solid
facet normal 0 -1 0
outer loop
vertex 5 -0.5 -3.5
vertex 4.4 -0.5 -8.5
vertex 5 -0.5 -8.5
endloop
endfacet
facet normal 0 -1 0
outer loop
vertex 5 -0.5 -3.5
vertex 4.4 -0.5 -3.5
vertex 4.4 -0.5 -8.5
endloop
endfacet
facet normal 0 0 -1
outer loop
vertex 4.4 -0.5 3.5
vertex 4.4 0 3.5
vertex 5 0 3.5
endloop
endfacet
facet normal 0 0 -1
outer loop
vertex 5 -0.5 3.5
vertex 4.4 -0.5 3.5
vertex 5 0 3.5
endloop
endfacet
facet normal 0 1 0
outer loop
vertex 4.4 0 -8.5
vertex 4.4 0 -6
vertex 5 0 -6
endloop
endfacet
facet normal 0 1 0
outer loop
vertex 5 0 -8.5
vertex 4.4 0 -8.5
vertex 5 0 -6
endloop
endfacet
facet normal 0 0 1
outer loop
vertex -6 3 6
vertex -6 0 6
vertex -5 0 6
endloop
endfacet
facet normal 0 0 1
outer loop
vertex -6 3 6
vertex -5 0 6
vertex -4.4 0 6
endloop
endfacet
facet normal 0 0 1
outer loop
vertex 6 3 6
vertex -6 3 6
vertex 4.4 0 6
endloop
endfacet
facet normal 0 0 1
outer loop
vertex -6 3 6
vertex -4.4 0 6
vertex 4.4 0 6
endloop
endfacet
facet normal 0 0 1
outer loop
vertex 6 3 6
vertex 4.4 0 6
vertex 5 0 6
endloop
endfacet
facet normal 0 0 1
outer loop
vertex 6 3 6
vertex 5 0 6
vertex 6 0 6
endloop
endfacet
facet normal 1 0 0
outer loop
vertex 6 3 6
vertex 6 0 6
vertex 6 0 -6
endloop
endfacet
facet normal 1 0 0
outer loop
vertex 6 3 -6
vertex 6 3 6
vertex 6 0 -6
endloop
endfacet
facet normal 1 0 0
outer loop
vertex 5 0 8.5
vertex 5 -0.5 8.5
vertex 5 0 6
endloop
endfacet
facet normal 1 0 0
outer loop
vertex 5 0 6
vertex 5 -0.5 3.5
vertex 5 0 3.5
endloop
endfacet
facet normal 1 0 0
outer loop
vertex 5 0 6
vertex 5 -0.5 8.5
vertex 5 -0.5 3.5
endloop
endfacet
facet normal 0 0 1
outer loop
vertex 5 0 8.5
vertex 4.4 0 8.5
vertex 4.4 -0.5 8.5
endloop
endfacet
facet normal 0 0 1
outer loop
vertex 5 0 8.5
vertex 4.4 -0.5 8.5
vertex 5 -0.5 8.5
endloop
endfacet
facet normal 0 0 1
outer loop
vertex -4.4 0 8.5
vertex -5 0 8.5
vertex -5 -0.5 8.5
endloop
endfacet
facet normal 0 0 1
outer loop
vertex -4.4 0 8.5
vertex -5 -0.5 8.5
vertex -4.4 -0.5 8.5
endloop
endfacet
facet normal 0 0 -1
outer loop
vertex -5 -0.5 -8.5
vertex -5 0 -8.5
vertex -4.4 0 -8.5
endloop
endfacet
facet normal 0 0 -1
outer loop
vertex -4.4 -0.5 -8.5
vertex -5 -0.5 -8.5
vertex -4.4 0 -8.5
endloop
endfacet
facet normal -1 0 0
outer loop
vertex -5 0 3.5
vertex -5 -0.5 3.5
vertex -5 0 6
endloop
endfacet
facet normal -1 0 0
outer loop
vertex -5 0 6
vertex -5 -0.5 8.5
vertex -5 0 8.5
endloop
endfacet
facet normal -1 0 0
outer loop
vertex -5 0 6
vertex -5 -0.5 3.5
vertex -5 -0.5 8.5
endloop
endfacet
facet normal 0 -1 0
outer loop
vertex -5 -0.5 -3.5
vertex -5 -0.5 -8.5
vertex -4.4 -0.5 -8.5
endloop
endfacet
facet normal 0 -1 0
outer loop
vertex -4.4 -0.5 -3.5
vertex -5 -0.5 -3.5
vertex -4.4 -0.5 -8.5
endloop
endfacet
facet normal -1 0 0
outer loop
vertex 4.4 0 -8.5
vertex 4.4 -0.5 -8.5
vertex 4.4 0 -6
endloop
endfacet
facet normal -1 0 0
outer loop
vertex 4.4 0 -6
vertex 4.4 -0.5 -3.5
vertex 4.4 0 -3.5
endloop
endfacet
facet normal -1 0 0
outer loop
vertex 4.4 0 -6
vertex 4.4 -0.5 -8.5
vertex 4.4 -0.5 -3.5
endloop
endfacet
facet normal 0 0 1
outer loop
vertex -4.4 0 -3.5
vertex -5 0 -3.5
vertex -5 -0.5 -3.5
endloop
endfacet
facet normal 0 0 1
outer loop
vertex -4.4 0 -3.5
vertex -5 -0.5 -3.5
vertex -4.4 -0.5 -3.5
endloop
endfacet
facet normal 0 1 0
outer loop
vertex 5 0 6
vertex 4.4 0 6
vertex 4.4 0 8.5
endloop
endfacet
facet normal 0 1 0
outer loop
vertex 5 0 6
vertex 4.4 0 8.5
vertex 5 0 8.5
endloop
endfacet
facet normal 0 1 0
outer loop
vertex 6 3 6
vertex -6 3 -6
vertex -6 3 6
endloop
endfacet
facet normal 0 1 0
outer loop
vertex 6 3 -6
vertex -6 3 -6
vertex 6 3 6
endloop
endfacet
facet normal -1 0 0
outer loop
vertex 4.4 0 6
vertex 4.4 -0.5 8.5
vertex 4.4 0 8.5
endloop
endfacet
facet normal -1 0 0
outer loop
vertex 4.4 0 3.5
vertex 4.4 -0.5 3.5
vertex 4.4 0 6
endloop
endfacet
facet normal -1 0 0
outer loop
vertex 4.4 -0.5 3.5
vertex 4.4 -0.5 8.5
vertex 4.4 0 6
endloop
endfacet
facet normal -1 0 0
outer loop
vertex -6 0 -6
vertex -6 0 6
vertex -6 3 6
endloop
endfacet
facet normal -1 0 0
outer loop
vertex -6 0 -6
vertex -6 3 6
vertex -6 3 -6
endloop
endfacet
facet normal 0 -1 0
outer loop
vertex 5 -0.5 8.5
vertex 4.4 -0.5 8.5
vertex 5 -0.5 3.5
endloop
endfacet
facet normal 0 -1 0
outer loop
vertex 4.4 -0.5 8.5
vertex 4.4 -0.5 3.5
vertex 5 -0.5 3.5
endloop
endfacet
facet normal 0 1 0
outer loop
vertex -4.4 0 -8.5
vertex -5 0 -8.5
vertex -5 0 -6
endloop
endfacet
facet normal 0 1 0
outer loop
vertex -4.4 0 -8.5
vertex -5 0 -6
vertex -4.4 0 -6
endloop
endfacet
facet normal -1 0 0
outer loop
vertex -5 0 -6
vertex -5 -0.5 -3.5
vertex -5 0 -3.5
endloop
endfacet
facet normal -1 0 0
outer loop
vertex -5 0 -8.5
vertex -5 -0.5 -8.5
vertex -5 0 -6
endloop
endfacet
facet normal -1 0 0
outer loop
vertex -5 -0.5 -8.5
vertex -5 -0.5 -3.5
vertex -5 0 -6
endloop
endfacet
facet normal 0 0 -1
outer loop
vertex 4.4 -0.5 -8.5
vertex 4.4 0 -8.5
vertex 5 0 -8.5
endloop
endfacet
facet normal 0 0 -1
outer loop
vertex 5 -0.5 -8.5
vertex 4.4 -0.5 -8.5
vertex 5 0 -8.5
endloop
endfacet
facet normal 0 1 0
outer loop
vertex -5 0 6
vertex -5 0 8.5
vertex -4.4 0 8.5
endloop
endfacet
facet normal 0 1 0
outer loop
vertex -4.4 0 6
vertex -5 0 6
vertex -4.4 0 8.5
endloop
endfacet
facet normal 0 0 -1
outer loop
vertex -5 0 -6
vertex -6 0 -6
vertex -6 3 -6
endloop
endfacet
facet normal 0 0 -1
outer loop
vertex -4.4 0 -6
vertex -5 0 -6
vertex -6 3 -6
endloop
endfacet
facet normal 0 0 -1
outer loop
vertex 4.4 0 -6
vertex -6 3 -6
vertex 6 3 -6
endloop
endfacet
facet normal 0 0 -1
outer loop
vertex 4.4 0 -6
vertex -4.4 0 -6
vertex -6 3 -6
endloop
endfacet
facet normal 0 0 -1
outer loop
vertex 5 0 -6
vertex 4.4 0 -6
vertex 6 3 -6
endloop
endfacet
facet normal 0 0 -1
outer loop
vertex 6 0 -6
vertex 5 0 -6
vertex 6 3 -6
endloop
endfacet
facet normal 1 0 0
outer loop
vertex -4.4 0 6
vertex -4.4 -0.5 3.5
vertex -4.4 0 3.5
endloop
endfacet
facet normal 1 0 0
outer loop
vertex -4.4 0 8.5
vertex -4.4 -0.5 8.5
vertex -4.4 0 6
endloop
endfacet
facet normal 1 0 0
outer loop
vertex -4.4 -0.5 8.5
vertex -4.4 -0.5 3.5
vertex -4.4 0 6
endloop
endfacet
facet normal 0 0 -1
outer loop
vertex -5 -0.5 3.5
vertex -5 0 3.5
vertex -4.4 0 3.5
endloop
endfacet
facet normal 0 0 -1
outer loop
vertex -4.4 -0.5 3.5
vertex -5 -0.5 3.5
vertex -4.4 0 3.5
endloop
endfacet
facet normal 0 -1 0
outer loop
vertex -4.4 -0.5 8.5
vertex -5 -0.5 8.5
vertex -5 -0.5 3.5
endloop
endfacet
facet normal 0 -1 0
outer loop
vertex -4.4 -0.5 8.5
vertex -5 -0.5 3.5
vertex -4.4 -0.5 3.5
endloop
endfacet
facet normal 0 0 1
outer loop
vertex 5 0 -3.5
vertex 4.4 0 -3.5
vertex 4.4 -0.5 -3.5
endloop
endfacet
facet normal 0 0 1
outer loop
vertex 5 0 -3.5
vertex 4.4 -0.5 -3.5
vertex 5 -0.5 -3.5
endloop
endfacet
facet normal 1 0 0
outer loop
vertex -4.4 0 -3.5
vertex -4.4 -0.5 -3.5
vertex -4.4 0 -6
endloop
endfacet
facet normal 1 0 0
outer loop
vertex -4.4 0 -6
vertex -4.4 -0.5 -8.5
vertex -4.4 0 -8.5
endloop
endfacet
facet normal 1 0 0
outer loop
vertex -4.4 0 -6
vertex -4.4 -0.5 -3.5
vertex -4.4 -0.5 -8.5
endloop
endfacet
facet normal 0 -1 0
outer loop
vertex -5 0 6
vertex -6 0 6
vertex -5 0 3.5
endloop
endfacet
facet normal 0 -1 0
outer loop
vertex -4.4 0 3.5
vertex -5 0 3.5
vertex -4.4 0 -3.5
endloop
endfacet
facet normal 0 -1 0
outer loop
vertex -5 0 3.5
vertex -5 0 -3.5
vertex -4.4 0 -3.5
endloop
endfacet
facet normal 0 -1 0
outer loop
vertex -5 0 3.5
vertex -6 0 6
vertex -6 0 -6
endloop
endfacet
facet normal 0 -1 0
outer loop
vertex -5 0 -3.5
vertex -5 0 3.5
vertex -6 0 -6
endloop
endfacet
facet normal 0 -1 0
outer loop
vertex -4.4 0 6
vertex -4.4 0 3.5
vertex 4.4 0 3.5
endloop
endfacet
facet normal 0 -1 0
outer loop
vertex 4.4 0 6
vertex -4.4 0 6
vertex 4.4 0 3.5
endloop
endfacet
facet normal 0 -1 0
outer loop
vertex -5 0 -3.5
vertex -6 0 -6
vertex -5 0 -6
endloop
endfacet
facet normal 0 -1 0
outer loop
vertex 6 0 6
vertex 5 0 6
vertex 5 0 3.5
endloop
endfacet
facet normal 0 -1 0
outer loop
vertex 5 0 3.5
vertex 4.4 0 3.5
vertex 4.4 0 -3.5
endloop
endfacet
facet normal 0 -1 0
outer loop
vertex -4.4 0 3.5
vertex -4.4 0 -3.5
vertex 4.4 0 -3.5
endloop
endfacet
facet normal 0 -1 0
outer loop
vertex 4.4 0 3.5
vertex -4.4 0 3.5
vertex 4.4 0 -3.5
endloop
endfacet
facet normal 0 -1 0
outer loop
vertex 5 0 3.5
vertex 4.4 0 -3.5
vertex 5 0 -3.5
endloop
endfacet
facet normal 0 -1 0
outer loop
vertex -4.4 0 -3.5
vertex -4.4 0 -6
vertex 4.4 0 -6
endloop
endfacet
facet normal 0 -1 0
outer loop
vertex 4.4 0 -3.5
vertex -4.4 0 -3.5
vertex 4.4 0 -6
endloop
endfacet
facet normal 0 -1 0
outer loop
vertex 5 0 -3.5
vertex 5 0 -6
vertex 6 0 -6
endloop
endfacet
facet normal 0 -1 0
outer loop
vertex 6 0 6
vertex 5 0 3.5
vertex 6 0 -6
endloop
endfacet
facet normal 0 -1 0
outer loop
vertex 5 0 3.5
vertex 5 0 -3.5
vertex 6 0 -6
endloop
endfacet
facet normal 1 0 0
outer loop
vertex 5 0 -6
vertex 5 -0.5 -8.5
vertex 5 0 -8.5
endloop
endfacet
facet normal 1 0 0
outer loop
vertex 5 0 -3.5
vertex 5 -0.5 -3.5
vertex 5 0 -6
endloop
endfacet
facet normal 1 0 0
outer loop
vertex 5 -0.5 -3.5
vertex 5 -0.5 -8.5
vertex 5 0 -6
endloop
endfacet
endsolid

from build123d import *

# Parameters (mm, degrees)
SKETCH1_W           = 12
SKETCH1_H           = 12
BOSS_EXTRUDE1_DEPTH = 3
SKETCH2_W           = 0.6
SKETCH2_H           = 0.5
BOSS_EXTRUDE2_DEPTH = 2.5


with BuildPart() as part:
    # Sketch1 → Boss-Extrude1 (new body)
    with BuildSketch(Plane(origin=(0, 0, 0), x_dir=(1, 0, 0), z_dir=(0, 1, 0))):
        Rectangle(SKETCH1_W, SKETCH1_H)
    extrude(amount=BOSS_EXTRUDE1_DEPTH)

    # Sketch2 → Boss-Extrude2 (add, symmetric)
    with BuildSketch(Plane.XY.offset(6)):
        with Locations((4.7, -0.25)):
            Rectangle(SKETCH2_W, SKETCH2_H)
        with Locations((-4.7, -0.25)):
            Rectangle(SKETCH2_W, SKETCH2_H)
    boss_extrude2 = extrude(amount=BOSS_EXTRUDE2_DEPTH, both=True)

    # Mirror1: Boss-Extrude2 across plane
    add(boss_extrude2.mirror(Plane.XY))


solid = part.part
